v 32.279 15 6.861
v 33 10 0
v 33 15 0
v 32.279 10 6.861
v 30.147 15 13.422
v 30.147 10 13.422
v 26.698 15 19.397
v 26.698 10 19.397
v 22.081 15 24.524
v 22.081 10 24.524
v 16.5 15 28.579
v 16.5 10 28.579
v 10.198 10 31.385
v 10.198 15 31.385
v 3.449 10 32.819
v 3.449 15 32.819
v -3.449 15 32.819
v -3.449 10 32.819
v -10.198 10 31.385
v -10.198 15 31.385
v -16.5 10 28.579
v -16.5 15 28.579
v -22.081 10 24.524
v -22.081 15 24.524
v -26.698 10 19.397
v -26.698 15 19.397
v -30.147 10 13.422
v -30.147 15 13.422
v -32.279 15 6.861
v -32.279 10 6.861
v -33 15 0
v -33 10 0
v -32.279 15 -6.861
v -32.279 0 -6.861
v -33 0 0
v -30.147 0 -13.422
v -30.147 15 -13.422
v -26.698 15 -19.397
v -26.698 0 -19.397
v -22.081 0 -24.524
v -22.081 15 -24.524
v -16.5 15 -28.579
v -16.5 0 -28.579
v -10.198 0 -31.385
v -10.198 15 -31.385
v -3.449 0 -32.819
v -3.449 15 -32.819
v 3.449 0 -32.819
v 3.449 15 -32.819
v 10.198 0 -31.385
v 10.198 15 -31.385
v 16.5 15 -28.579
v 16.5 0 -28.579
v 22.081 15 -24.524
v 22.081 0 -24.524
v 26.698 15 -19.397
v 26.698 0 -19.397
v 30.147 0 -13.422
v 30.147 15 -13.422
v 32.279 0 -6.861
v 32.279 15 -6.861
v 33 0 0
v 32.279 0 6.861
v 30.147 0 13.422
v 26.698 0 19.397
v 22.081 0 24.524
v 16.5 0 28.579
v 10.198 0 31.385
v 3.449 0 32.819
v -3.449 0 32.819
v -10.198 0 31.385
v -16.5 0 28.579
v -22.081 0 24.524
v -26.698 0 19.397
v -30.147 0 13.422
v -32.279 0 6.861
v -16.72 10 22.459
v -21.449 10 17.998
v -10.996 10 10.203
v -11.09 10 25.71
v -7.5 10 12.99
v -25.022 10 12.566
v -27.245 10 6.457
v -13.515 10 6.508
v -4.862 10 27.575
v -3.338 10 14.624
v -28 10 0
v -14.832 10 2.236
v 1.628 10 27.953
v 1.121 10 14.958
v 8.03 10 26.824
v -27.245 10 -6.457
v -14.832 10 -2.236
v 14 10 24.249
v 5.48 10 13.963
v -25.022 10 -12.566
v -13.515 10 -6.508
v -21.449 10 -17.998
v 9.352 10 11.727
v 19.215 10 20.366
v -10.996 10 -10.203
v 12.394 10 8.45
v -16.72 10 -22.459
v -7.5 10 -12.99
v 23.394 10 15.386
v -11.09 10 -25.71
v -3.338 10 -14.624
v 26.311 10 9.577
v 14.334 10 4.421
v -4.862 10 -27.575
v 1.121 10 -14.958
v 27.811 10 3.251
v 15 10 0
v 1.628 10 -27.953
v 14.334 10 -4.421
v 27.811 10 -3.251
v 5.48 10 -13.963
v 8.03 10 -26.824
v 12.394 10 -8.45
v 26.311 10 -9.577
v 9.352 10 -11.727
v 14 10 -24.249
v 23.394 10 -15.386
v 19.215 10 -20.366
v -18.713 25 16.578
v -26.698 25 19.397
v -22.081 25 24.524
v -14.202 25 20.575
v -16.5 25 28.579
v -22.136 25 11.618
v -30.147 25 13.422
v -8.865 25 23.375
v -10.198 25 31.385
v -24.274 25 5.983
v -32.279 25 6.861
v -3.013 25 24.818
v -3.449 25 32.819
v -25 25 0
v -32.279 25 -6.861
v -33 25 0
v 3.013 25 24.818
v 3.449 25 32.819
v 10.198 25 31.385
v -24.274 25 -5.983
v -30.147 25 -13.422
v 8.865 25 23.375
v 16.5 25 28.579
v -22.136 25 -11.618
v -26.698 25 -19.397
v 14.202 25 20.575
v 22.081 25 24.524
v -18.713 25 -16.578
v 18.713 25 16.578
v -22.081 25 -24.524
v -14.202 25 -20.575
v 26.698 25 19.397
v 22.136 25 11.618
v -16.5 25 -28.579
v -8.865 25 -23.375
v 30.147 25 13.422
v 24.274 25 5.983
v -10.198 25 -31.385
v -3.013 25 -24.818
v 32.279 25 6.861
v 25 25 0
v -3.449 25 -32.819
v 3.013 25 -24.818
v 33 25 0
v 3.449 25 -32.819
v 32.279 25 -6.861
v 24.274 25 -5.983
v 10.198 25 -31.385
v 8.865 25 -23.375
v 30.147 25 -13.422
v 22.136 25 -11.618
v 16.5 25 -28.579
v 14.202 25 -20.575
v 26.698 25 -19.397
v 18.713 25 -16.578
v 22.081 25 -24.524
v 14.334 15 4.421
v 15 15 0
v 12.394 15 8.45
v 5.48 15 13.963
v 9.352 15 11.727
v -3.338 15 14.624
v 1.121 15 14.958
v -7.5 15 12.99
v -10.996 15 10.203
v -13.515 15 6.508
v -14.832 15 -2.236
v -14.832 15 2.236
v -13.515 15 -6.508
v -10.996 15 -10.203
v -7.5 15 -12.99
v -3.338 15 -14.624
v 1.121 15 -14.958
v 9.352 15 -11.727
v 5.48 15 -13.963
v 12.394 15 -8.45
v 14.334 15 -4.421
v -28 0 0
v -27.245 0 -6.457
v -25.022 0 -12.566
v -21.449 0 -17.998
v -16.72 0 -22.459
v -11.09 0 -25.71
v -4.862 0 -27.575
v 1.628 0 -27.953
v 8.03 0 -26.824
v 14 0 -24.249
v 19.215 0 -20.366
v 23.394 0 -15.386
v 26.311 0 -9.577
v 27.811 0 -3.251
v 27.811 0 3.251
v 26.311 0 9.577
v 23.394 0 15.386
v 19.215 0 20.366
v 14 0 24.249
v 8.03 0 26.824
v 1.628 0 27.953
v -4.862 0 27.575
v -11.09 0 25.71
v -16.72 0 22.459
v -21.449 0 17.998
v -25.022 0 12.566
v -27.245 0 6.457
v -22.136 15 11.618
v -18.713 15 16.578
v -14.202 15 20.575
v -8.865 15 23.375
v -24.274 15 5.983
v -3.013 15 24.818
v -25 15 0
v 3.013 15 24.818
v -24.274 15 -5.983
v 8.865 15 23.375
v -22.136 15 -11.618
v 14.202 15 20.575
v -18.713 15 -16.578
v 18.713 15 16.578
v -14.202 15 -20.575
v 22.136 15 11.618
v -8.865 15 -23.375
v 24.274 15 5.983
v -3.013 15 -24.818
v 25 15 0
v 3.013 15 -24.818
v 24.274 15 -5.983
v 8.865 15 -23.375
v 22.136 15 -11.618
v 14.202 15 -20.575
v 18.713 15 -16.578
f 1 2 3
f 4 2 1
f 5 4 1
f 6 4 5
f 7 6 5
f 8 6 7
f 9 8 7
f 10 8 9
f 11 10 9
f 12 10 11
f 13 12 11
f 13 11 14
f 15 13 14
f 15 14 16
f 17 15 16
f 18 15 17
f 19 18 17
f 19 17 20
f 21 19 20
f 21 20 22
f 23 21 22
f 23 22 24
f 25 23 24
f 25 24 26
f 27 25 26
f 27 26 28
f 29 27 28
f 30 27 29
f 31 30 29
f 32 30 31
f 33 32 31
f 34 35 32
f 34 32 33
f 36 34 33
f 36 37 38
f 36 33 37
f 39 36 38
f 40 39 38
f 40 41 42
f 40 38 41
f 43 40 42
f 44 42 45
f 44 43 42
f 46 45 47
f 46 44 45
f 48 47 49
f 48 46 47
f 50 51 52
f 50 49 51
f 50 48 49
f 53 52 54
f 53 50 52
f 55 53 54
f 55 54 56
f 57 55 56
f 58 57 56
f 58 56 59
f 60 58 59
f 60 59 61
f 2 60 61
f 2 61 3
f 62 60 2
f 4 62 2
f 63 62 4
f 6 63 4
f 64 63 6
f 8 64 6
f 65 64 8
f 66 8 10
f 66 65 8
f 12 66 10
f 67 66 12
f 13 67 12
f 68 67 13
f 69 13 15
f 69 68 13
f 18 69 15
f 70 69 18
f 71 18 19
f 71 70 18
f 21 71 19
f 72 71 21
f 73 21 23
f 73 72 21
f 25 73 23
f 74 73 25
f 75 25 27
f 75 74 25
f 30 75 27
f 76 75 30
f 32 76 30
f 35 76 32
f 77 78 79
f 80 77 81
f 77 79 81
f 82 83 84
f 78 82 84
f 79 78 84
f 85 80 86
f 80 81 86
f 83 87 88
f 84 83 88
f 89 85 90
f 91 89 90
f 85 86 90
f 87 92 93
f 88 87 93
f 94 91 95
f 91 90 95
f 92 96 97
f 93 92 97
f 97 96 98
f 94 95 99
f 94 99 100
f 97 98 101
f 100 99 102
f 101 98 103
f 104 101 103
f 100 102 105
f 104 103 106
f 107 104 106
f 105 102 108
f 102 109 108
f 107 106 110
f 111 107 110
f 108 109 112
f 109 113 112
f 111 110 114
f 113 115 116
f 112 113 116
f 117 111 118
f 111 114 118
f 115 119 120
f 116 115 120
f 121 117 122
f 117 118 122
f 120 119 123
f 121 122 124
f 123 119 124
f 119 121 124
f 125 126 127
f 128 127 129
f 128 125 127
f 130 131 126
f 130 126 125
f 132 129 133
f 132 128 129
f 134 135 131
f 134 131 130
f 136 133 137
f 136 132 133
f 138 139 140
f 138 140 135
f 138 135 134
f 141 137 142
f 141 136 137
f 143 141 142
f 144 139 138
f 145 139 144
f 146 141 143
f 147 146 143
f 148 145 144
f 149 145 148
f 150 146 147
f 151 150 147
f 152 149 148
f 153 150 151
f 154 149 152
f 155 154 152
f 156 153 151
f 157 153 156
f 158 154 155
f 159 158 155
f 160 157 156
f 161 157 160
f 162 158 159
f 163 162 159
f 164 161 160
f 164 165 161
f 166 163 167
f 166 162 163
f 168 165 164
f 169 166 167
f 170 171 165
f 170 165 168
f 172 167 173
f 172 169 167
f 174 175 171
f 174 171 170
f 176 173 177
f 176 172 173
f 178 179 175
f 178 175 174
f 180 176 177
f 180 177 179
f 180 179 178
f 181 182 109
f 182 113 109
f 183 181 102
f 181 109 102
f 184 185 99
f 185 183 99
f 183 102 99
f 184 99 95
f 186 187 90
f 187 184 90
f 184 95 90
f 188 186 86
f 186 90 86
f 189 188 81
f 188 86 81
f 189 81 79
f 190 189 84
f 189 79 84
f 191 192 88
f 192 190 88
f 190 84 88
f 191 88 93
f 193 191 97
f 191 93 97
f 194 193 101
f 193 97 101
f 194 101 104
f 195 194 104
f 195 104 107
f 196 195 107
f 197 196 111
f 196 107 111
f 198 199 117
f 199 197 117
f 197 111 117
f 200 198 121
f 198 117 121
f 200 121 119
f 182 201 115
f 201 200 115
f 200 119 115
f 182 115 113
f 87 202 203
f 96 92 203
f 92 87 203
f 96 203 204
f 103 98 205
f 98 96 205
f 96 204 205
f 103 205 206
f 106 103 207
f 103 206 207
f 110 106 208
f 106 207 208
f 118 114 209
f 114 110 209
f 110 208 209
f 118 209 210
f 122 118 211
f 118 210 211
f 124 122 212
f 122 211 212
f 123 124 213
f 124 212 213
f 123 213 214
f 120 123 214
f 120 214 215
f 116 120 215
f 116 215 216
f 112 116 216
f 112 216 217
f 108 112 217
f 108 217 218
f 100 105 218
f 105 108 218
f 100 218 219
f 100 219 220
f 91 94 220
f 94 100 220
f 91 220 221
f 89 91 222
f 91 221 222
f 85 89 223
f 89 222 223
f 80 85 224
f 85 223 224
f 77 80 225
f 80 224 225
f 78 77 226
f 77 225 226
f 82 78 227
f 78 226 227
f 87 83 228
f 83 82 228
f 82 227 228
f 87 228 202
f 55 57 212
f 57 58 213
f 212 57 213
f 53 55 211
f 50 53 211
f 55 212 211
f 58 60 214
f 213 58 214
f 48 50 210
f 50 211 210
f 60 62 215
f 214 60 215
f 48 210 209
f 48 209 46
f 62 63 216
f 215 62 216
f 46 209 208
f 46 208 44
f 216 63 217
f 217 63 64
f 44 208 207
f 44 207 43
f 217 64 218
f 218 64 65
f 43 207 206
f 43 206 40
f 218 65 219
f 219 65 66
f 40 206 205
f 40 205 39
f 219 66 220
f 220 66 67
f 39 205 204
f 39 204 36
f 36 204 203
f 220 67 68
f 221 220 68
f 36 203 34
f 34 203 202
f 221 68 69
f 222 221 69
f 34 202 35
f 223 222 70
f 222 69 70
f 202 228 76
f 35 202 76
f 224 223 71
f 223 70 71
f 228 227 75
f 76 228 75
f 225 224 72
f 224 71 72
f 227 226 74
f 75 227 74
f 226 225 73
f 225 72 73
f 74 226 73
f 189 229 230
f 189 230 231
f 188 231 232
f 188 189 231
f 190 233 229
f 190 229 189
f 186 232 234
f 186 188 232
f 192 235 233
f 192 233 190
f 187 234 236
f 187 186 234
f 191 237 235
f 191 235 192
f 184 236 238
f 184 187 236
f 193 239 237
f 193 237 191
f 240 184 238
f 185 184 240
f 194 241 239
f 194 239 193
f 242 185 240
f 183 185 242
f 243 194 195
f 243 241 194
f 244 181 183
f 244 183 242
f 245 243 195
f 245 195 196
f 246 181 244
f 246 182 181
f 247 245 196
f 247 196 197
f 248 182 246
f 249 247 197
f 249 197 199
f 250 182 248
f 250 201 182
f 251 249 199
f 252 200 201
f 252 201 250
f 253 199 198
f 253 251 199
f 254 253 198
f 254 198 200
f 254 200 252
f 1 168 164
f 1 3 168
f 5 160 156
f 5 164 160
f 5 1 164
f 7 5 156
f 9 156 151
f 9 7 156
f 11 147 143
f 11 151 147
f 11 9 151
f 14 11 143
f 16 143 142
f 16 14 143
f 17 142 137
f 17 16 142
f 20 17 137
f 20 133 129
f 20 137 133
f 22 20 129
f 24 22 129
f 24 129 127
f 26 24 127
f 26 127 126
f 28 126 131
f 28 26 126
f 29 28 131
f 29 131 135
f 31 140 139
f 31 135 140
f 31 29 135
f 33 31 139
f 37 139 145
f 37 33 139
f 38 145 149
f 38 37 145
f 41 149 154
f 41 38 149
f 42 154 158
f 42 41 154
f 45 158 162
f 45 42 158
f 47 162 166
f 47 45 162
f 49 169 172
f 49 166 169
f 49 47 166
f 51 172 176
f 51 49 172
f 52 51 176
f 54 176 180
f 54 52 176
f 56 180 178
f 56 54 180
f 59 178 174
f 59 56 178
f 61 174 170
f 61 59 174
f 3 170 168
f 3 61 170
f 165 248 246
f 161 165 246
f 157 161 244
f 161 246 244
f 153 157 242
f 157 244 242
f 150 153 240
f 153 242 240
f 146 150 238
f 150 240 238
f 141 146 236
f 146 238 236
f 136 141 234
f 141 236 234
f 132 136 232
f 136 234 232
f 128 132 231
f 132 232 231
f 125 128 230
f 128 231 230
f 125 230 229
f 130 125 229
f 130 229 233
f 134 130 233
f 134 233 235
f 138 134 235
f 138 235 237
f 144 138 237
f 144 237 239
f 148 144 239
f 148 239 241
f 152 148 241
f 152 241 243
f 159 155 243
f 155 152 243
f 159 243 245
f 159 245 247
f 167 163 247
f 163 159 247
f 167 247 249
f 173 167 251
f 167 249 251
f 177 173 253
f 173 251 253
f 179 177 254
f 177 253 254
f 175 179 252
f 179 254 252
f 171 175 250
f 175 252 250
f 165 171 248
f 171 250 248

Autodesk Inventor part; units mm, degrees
ref_plane "YZ Plane" through (0, 0, 0) normal (1, 0, 0) x (0, 1, 0)
ref_plane "XZ Plane" through (0, 0, 0) normal (0, 1, 0) x (-1, 0, 0)
ref_plane "XY Plane" through (0, 0, 0) normal (0, 0, 1) x (1, 0, 0)
sketch "Sketch1" plane through (0, 0, 0) normal (0, 1, 0) x (-1, 0, 0)
  circle A0 centre (0, 0) radius 28
  circle A1 centre (0, 0) radius 33
  dimension "d0" = 56
  dimension "d1" = 66
extrude "Extrusion1" add sketch "Sketch1" along normal blind 10
sketch "Sketch2" plane through (0, 10, 0) normal (0, 1, 0) x (1, 0, 0)
  circle A0 centre (0, 0) radius 15
  circle A1 centre (0, 0) radius 33 projected
  dimension "d4" = 30
extrude "Extrusion2" add sketch "Sketch2" along normal blind 5
sketch "Sketch3" plane through (0, 15, 0) normal (0, 1, 0) x (1, 0, 0)
  circle A0 centre (0, 0) radius 25
  circle A1 centre (0, 0) radius 33
  dimension "d7" = 66
  dimension "d8" = 50
extrude "Extrusion3" add sketch "Sketch3" along normal blind 10
properties part number "bigbearingcup" material "Steel"
